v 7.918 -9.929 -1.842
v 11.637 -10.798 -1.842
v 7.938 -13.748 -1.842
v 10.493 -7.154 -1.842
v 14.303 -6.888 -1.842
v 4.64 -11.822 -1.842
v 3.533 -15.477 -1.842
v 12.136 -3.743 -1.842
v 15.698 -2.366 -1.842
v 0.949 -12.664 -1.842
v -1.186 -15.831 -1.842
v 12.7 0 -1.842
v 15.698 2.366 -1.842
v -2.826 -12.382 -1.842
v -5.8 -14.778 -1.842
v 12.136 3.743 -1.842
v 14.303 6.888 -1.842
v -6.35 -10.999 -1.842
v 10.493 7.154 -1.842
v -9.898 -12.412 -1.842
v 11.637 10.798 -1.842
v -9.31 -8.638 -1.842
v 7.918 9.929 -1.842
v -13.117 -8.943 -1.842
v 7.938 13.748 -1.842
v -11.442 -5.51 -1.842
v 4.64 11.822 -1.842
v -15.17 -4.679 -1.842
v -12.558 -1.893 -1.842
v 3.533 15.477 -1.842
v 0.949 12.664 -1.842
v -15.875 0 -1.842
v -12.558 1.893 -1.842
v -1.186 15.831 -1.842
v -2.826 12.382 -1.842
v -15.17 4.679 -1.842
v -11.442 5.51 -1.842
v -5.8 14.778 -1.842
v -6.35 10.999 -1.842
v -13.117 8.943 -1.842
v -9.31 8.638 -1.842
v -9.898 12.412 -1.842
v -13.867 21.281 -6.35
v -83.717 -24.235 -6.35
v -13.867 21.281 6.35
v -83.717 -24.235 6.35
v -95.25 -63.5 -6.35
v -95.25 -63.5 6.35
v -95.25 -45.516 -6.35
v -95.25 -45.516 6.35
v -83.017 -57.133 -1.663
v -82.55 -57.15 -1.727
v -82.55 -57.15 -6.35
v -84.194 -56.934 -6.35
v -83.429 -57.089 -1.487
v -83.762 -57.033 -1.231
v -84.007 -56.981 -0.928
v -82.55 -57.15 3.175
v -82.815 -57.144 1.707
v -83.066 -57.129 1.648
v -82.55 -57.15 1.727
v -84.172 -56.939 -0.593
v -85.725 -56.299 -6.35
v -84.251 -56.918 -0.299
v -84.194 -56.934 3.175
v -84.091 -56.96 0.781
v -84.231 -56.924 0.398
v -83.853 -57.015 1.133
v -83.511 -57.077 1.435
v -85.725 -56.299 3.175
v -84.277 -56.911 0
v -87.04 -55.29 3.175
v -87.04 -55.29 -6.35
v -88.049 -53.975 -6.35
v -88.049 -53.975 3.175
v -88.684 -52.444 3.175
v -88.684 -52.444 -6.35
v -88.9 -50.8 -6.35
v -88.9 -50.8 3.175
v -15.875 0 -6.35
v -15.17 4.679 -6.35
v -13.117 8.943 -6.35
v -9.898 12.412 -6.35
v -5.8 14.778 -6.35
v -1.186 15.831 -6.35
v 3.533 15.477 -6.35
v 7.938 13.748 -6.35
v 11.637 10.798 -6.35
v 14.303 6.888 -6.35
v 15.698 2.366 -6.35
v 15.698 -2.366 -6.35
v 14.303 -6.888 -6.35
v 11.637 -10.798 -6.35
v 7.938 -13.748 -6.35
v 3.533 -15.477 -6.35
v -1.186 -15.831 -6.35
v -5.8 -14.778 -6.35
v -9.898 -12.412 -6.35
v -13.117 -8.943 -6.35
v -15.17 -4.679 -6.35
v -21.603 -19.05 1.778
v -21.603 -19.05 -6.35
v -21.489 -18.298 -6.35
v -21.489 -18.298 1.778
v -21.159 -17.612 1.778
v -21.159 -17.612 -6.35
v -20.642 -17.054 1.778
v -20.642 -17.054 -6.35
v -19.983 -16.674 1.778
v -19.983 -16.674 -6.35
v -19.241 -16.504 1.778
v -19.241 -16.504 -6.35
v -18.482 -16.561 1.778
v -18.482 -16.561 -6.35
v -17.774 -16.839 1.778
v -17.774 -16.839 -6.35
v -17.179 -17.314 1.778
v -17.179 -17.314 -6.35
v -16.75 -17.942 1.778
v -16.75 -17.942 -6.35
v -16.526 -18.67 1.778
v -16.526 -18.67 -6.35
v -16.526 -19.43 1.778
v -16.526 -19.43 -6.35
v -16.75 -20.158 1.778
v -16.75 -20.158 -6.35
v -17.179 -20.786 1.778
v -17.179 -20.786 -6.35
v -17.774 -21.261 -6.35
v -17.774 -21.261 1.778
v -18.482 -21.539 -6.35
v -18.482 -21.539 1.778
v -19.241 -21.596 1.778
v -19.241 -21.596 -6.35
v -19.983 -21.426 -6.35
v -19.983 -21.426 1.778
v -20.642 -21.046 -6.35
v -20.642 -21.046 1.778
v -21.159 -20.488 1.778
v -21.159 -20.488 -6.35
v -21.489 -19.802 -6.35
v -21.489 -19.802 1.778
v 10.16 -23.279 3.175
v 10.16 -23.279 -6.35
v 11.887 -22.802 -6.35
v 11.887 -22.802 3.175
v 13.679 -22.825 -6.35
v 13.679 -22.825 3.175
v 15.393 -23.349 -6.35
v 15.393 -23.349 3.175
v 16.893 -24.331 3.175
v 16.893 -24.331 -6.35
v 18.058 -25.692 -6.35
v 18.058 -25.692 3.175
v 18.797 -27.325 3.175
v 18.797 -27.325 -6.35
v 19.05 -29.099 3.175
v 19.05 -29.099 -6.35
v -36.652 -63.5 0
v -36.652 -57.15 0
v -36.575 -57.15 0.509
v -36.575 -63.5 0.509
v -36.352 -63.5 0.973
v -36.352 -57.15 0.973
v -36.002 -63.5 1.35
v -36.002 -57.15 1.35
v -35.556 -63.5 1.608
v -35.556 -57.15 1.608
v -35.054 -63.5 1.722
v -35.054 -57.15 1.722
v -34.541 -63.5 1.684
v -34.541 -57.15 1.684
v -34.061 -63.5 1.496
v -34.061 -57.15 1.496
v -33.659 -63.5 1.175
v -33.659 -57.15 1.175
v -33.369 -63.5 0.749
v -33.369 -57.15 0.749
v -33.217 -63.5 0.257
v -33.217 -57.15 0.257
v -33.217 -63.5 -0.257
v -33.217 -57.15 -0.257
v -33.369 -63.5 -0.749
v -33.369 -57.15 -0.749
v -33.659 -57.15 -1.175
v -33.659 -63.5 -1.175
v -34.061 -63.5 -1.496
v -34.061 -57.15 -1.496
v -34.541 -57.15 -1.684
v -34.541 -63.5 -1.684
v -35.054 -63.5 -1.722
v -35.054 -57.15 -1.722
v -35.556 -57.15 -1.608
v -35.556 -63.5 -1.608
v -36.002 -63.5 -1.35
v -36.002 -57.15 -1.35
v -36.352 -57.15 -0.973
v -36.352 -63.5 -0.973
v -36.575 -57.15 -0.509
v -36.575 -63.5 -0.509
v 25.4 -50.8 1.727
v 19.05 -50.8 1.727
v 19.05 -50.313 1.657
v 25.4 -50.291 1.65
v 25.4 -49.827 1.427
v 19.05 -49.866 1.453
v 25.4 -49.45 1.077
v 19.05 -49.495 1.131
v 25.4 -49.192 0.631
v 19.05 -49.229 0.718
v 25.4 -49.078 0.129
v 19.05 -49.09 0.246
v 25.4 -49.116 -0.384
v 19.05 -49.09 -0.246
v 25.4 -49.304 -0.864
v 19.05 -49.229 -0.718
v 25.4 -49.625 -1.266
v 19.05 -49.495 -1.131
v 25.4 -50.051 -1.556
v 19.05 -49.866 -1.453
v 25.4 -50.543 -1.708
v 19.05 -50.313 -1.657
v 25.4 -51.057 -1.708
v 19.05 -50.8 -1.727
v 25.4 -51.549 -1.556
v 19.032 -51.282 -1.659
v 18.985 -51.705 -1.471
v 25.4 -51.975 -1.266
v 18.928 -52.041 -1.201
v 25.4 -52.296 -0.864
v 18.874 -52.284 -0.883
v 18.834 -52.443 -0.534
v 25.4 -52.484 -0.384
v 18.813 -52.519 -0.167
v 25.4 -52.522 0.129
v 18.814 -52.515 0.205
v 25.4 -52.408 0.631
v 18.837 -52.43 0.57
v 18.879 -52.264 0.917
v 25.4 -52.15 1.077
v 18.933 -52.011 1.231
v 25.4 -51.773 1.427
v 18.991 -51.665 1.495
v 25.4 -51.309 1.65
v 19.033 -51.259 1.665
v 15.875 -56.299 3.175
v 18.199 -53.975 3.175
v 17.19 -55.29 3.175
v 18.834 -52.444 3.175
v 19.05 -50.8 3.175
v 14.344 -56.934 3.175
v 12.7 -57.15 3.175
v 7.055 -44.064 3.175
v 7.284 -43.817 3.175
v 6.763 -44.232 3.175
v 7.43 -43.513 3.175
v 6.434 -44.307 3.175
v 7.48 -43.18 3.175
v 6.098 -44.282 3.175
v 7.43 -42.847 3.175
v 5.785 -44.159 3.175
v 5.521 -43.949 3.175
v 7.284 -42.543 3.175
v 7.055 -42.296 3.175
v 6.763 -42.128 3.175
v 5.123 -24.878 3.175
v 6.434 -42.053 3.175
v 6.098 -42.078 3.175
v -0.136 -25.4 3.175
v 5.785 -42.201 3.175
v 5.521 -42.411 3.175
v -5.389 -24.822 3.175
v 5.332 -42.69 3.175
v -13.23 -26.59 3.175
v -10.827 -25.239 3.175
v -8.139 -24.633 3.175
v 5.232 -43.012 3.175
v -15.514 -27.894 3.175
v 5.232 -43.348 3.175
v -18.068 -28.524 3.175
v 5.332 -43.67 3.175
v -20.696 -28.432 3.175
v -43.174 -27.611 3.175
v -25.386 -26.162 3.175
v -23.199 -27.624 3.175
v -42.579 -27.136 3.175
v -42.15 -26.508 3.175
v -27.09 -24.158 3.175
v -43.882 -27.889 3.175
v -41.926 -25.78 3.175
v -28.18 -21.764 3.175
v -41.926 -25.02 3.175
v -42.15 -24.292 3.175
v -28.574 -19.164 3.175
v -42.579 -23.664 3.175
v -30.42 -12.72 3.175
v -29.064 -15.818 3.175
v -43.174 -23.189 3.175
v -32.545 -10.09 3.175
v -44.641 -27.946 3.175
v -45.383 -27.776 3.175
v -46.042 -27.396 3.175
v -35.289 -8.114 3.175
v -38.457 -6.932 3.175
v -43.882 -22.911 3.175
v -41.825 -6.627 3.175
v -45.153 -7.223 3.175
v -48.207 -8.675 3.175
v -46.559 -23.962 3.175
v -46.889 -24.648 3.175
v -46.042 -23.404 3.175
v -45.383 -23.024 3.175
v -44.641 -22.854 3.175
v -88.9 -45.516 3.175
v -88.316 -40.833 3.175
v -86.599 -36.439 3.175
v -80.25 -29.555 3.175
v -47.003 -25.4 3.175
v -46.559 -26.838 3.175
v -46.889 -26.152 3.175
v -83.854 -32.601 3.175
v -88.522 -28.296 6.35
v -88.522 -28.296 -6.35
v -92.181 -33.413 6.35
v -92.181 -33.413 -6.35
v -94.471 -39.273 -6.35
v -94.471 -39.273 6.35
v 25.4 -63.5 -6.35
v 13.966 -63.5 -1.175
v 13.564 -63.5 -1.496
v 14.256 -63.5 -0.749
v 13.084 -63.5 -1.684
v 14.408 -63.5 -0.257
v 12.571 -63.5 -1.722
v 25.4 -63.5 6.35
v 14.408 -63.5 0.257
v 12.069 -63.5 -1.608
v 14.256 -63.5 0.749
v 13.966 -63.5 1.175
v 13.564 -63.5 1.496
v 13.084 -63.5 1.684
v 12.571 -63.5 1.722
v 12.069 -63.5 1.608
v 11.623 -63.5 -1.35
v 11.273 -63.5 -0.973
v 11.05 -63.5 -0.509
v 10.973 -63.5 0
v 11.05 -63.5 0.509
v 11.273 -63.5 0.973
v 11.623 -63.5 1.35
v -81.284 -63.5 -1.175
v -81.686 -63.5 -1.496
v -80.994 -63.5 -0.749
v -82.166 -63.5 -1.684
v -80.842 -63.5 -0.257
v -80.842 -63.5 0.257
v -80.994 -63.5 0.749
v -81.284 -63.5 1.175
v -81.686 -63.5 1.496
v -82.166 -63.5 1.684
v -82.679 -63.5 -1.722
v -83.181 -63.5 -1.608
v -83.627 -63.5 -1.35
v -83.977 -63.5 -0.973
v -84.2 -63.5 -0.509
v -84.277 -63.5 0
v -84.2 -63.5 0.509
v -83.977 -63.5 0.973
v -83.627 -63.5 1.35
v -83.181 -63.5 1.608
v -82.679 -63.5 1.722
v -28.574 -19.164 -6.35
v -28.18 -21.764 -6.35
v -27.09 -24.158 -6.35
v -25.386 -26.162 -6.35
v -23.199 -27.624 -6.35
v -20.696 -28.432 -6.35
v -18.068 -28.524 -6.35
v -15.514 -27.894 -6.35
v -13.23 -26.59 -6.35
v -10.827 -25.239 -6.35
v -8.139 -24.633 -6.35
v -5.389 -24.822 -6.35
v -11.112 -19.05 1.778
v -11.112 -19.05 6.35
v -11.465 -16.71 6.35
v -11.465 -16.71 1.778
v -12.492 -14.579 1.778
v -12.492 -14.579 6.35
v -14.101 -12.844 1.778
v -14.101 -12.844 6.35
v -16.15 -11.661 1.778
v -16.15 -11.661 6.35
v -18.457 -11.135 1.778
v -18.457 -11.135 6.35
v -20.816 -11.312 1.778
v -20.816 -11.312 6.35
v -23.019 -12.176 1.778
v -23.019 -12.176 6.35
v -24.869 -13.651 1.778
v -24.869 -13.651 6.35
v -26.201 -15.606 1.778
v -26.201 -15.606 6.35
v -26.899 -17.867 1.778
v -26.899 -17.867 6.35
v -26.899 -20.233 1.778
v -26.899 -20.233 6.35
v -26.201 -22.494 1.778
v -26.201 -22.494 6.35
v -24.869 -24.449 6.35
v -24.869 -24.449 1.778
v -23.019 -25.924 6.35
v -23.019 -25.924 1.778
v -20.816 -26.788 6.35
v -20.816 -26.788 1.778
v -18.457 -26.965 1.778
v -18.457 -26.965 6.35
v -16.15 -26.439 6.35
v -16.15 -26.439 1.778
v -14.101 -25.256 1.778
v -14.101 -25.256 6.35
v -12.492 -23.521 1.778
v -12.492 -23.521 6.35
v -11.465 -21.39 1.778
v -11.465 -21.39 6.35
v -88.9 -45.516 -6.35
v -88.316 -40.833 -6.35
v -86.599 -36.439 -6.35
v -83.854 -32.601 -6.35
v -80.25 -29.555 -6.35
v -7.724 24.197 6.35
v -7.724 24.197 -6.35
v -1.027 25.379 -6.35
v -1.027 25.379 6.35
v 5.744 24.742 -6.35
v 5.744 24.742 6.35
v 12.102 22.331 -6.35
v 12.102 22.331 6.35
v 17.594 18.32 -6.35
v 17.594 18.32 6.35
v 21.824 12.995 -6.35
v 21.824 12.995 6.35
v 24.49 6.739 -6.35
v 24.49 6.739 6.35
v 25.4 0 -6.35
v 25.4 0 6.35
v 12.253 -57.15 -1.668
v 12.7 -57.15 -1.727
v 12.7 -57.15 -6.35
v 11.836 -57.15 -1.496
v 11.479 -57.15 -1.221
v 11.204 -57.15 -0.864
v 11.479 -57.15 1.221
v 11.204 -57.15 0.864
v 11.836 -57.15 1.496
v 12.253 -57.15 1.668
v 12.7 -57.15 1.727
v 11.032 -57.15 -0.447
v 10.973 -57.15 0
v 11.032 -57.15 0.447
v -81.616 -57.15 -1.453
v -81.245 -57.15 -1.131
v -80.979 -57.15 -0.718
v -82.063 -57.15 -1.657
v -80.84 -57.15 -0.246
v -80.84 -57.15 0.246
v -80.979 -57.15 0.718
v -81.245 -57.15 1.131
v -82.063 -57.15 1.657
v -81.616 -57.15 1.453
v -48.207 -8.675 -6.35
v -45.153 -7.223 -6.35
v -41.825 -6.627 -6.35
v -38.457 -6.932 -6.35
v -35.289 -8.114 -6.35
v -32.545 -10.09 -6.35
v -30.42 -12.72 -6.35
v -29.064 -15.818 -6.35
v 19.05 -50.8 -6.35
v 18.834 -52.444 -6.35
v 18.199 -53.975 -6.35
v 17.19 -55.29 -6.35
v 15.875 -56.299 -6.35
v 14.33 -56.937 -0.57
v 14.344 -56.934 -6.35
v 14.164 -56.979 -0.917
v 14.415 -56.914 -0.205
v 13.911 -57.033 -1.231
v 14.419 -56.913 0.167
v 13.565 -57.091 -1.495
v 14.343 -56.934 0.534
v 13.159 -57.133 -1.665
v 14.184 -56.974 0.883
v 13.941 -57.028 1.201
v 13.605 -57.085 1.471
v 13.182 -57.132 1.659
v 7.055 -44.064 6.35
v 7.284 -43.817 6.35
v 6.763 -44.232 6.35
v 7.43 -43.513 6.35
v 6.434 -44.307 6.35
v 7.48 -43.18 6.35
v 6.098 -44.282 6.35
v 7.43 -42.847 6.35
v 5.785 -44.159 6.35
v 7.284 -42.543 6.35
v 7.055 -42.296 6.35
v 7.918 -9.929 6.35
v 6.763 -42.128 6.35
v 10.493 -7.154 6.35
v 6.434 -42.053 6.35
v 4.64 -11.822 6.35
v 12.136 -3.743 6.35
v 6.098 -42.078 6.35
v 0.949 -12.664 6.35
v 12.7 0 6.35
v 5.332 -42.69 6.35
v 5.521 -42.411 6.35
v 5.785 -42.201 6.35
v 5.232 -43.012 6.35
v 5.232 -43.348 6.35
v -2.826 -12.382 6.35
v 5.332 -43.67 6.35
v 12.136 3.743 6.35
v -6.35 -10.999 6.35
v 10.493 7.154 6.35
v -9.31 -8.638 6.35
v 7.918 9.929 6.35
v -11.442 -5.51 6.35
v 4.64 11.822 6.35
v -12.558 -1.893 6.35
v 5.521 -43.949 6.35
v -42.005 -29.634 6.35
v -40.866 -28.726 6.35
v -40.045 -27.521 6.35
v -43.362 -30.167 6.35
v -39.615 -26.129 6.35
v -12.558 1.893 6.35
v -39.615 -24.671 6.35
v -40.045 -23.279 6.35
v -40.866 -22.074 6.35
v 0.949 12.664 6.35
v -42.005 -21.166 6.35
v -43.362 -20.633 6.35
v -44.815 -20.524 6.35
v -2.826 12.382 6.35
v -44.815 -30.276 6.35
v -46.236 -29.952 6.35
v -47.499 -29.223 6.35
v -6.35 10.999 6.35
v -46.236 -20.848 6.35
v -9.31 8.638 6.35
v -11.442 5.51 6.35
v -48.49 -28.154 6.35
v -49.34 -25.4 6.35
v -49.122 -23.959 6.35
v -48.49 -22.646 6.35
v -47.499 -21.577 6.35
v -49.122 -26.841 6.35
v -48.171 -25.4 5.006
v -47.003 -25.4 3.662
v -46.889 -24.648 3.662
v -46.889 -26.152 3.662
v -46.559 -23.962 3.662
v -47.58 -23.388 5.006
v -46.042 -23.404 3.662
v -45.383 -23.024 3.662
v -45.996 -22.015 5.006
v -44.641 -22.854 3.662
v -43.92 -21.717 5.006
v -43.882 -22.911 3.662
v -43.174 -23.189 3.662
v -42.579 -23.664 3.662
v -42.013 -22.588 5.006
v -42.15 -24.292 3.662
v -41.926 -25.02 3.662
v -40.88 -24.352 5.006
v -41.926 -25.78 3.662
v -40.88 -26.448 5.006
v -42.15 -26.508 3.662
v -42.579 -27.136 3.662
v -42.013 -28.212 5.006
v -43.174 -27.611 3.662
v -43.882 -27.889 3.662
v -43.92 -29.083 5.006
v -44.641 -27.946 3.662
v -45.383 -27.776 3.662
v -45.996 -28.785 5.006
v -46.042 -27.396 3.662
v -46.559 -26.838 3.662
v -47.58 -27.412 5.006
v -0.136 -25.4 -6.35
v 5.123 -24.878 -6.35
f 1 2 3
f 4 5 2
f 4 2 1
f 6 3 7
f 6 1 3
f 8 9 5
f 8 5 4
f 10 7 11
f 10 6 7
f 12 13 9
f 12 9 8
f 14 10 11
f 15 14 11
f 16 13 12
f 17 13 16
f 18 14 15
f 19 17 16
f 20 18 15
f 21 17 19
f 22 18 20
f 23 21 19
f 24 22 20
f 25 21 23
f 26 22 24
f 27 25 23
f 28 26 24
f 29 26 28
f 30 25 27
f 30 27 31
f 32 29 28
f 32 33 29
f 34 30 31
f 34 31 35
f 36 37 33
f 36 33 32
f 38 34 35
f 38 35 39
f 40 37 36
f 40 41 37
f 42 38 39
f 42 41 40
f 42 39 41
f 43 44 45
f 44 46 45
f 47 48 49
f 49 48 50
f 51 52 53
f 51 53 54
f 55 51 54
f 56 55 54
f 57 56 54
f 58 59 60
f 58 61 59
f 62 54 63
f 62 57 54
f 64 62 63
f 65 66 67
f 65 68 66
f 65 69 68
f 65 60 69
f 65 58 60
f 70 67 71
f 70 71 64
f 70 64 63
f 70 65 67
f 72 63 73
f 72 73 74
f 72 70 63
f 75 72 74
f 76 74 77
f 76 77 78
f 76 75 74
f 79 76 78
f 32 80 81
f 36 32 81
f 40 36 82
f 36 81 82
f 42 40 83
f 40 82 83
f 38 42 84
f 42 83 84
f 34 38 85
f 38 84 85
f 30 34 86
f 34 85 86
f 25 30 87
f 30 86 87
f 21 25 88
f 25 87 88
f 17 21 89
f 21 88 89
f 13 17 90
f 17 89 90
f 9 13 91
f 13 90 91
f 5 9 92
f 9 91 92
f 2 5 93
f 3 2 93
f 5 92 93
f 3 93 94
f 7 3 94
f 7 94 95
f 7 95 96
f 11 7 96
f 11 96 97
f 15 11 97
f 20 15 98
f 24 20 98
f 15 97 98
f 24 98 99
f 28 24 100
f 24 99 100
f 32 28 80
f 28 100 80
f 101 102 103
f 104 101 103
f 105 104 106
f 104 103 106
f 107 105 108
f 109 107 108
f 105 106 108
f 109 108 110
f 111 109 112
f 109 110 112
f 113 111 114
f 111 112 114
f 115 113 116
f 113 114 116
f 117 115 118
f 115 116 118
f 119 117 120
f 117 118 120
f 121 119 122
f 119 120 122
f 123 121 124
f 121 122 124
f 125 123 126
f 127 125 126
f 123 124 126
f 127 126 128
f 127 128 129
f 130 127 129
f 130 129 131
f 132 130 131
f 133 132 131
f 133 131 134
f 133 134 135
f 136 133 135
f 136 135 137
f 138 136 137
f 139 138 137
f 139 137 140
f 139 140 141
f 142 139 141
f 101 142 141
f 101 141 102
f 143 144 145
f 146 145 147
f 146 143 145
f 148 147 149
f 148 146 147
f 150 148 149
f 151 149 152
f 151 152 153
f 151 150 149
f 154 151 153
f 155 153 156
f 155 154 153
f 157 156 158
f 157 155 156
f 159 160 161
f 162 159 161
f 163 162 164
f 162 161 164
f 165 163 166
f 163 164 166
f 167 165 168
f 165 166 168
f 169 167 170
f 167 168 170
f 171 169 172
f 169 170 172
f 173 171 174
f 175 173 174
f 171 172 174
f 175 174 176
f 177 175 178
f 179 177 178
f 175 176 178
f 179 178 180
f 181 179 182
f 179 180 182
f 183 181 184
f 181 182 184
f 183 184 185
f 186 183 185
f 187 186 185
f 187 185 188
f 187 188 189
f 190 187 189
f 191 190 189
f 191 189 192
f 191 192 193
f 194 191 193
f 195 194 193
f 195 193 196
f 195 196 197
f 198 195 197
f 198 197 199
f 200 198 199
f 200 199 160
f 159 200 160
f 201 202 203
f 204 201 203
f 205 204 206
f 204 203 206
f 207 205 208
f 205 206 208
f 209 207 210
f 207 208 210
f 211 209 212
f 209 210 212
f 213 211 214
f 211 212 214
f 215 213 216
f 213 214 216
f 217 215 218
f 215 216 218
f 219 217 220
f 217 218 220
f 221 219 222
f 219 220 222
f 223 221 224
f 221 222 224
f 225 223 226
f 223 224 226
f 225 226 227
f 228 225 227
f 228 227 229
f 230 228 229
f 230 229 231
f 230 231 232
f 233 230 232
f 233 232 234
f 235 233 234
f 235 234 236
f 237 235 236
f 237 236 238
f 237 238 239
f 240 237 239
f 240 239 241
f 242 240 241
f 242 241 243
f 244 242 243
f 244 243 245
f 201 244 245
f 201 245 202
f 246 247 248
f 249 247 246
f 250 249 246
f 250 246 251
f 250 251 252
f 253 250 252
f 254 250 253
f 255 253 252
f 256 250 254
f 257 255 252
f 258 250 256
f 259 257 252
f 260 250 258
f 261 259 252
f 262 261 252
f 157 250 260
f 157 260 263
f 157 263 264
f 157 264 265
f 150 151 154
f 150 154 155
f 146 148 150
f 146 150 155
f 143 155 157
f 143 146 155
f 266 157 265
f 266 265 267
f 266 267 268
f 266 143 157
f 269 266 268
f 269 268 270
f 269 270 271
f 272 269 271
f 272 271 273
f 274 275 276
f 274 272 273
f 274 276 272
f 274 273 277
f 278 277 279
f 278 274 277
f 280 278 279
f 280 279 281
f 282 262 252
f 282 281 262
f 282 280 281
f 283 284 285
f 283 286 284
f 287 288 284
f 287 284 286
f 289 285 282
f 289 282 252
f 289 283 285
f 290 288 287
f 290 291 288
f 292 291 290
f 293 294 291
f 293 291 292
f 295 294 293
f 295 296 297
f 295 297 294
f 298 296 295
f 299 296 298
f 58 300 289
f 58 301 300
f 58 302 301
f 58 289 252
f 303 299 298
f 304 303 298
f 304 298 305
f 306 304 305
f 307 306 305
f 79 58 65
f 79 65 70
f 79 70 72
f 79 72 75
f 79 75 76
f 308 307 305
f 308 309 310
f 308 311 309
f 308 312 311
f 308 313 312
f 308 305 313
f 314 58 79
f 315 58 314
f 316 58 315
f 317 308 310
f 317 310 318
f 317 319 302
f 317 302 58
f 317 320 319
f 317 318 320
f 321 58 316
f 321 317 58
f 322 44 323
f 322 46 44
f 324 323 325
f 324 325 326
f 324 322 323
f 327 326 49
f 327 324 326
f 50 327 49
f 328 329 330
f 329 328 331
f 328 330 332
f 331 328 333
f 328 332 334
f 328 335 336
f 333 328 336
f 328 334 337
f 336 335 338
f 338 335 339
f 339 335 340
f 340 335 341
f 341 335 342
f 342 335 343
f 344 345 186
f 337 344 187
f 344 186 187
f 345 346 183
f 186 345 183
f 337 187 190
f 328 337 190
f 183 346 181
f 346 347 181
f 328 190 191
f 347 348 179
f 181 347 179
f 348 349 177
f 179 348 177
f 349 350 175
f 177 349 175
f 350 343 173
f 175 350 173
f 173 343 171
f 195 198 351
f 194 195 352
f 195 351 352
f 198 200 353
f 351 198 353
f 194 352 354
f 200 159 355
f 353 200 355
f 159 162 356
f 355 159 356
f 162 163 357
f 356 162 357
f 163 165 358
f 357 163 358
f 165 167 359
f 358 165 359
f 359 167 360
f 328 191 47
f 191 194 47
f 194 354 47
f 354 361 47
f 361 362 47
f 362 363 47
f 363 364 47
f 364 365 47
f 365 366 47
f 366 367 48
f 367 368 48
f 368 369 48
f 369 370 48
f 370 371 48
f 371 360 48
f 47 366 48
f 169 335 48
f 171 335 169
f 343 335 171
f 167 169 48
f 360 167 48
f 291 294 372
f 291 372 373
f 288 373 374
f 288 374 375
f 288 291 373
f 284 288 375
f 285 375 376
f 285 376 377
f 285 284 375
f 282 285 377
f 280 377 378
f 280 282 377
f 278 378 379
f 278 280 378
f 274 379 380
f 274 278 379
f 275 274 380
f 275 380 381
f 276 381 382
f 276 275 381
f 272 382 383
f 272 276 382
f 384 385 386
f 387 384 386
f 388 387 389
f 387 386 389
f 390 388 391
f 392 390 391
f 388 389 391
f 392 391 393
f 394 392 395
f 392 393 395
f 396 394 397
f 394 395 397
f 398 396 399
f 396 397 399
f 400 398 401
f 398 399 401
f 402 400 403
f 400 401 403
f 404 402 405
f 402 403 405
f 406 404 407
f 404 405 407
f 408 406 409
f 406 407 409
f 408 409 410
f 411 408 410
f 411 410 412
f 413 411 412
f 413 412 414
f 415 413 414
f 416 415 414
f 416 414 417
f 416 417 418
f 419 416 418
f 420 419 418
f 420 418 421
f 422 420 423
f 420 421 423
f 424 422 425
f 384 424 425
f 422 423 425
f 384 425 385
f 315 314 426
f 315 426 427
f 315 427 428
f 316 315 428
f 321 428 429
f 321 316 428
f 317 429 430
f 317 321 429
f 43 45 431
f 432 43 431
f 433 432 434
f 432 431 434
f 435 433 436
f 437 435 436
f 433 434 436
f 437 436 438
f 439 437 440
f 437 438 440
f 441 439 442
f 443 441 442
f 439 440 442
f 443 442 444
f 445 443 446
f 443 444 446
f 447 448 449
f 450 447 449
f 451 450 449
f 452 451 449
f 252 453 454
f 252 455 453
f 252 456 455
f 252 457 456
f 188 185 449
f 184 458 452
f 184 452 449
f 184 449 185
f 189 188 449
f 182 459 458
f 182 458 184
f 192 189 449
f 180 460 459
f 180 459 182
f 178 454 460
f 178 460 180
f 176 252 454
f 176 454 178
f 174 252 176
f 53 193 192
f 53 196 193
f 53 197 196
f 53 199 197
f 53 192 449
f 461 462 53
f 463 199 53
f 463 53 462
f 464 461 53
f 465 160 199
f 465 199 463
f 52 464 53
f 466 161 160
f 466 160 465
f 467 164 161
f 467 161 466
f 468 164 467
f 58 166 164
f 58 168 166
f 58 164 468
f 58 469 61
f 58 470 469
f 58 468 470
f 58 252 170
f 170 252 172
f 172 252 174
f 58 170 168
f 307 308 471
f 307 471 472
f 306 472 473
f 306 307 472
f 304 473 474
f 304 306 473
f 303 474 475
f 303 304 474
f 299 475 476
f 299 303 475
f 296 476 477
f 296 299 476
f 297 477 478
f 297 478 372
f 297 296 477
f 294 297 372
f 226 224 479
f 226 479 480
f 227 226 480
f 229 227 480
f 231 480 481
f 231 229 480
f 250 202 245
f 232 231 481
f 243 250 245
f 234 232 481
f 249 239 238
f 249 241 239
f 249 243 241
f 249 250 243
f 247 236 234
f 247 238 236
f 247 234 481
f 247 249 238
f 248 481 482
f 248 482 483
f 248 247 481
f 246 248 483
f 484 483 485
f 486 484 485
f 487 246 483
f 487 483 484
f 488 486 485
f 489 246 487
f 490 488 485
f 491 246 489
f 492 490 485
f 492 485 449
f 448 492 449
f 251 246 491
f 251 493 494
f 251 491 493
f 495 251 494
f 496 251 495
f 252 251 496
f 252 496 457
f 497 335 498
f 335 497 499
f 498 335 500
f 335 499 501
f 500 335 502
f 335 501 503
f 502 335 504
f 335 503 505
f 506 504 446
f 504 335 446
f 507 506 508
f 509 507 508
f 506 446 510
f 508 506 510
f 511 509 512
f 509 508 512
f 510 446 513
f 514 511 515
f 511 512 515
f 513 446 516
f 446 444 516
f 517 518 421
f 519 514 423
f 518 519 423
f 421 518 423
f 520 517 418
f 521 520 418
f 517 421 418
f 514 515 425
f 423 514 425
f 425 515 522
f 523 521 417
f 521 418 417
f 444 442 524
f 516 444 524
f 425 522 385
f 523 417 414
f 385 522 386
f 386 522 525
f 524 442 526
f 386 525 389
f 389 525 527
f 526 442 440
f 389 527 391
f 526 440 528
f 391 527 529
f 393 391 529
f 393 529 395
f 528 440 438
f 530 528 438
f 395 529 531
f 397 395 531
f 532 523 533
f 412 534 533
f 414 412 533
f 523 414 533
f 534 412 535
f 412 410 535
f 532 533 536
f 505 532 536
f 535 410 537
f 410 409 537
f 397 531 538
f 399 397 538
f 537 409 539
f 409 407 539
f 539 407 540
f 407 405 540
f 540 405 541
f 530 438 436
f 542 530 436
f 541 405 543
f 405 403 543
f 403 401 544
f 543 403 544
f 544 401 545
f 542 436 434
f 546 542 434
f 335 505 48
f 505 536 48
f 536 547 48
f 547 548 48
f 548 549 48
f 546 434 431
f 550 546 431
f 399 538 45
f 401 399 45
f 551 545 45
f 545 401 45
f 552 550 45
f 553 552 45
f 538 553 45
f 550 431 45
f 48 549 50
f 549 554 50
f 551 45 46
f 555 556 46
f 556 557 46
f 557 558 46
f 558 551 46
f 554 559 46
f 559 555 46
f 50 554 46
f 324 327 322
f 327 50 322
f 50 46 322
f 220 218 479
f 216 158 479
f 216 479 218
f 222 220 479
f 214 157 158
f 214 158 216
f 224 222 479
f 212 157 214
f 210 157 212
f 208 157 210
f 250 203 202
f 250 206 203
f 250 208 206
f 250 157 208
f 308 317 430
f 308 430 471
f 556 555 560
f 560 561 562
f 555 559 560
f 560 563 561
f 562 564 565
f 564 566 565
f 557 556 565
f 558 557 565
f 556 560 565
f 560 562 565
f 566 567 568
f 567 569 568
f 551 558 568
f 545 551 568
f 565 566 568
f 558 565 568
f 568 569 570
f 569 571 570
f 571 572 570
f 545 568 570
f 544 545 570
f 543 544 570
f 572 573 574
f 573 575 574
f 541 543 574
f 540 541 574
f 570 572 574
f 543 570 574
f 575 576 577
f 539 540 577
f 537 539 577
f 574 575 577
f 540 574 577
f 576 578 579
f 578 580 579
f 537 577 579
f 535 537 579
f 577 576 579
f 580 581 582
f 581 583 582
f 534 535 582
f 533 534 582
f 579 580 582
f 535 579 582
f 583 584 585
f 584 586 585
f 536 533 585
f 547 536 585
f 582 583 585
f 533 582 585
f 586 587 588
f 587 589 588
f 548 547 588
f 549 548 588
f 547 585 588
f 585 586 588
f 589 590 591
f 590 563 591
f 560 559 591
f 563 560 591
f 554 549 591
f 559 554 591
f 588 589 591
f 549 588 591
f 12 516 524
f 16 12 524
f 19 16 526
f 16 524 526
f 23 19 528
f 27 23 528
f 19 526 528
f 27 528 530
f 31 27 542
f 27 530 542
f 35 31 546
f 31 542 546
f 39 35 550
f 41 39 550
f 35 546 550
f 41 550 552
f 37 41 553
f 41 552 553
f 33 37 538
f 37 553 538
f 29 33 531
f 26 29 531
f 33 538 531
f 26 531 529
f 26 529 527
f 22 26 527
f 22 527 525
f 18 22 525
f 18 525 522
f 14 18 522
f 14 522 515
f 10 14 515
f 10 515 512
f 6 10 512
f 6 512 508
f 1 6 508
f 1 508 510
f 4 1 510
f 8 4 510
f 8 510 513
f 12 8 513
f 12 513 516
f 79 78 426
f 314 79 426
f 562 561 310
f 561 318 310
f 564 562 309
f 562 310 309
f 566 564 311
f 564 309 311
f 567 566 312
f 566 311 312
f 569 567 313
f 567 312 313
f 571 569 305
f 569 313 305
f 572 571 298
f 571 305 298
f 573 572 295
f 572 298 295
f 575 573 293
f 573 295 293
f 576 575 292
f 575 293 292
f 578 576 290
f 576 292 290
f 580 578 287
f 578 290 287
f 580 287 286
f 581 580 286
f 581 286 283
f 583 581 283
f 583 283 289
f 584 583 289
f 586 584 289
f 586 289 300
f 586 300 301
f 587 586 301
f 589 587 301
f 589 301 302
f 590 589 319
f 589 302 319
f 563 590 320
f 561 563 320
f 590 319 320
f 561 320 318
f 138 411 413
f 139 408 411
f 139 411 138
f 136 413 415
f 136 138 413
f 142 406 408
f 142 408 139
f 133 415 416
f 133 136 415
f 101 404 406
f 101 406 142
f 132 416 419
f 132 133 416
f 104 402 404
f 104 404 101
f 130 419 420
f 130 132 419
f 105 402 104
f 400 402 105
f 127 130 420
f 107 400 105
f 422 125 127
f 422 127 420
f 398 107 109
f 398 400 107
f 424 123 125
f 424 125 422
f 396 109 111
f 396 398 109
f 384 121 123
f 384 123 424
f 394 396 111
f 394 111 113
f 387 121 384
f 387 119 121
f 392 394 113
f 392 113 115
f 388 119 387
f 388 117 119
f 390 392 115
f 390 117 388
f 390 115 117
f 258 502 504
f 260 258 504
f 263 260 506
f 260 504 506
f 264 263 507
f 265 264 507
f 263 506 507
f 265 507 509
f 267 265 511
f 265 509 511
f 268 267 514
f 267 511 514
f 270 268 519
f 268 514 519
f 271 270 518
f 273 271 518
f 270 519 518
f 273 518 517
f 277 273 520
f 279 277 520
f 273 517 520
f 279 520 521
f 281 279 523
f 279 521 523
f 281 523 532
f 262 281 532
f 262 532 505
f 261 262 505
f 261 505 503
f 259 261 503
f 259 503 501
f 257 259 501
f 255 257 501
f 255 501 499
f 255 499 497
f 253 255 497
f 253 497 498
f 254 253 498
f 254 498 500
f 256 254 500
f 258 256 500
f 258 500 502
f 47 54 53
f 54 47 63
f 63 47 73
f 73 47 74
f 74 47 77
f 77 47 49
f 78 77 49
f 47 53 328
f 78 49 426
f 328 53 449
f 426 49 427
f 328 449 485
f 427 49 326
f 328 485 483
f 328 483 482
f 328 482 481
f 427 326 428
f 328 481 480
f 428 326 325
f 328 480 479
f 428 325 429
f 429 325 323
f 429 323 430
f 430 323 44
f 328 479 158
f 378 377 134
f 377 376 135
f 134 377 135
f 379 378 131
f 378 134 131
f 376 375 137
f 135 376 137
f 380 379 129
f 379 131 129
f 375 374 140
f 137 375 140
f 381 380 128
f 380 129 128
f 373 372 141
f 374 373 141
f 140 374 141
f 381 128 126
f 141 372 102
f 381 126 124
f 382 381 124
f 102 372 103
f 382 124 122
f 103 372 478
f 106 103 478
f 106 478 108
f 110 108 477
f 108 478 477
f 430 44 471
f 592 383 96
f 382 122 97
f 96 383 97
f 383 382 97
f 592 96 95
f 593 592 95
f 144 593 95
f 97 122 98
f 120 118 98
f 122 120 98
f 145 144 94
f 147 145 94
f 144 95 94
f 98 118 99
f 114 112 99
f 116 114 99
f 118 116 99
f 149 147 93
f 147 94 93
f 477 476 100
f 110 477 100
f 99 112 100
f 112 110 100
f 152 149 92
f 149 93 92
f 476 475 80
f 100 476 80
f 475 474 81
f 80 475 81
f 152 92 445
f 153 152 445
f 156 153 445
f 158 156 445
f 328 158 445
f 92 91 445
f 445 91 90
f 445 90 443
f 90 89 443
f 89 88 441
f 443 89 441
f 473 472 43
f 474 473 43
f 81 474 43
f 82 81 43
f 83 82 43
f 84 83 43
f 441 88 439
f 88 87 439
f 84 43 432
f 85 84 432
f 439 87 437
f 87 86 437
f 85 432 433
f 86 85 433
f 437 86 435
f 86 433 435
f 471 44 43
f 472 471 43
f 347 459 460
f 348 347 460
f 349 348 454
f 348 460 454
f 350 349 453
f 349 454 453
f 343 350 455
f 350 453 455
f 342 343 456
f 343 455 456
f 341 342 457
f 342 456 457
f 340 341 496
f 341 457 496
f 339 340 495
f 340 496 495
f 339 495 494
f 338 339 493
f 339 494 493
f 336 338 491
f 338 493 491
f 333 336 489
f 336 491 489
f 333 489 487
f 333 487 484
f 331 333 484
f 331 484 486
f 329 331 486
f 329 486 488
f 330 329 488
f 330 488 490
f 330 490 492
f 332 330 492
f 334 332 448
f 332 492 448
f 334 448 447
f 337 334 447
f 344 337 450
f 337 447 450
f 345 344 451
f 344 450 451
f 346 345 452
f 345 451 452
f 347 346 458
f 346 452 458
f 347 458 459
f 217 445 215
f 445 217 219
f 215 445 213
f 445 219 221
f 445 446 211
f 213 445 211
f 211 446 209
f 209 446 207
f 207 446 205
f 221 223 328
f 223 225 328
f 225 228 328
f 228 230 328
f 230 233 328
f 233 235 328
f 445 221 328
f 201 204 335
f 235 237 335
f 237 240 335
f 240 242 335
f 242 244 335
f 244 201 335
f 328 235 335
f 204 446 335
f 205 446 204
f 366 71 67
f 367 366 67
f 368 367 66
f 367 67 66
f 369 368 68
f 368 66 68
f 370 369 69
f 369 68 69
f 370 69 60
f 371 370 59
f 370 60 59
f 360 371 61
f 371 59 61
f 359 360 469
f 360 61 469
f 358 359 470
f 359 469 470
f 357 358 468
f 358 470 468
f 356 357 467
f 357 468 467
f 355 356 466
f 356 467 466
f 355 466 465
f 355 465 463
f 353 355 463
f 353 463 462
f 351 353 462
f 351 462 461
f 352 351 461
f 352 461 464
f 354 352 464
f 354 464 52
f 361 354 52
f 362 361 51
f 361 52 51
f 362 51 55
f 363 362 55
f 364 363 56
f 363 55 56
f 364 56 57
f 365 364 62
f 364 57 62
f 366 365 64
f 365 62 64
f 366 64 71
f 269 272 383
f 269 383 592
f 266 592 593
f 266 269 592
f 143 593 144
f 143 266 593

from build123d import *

# Parameters (mm, degrees)
BOSS_EXTRUDE1_DEPTH                             = 6.35
SKETCH4_R                                       = 12.7
CUT_EXTRUDE3_DEPTH                              = 116.178567885
SKETCH5_R                                       = 15.875
CUT_EXTRUDE4_DEPTH                              = 4.5085
FILLET1_R                                       = 25.4
F_8_32_TAPPED_HOLE2_D                           = 3.4544
F_8_32_TAPPED_HOLE2_DEPTH                       = 10.668
F_8_32_TAPPED_HOLE2_TIP                         = 1.037806461
F_1_4_20_TAPPED_HOLE1_D                         = 5.1054
SKETCH27_R                                      = 7.9375
CUT_EXTRUDE6_DEPTH                              = 4.572
CUT_EXTRUDE8_START                              = -9.525
CUT_EXTRUDE8_DEPTH                              = 9.525
FILLET2_R                                       = 6.35
F_8_32_TAPPED_HOLE1_D                           = 3.4544
F_8_32_TAPPED_HOLE1_DEPTH                       = 10.668
F_8_32_TAPPED_HOLE1_TIP                         = 1.037806461
F_4_40_TAPPED_HOLE1_D                           = 2.2606
F_4_40_TAPPED_HOLE1_DEPTH                       = 7.62
F_4_40_TAPPED_HOLE1_TIP                         = 0.679152758
CSK_FOR_10_FLAT_HEAD_MACHINE_SCREW1_D           = 5.1054
CSK_FOR_10_FLAT_HEAD_MACHINE_SCREW1_CSINK_D     = 9.779
CSK_FOR_10_FLAT_HEAD_MACHINE_SCREW1_CSINK_ANGLE = 82


with BuildPart() as part:
    # Sketch1 → Boss-Extrude1 (new, symmetric)
    with BuildSketch(Plane.XY):
        with BuildLine():
            Line((25.4, 0), (25.4, -63.5))
            Line((25.4, -63.5), (-95.25, -63.5))
            Line((-95.25, -63.5), (-95.25, -31.75))
            Line((-95.25, -31.75), (-13.866905739, 21.280717216))
            ThreePointArc((-13.866905739, 21.280717216), (12.10249136, 22.33136142), (25.4, 0))
        make_face()
    extrude(amount=BOSS_EXTRUDE1_DEPTH, both=True)

    # Sketch4 → Cut-Extrude3 (cut, through all)
    with BuildSketch(Plane.XY.offset(6.35)):
        Circle(SKETCH4_R)
    extrude(amount=-CUT_EXTRUDE3_DEPTH, mode=Mode.SUBTRACT)

    # Sketch5 → Cut-Extrude4 (cut)
    with BuildSketch(Plane(origin=(0, 0, -6.35), x_dir=(-1, 0, 0), z_dir=(0, 0, -1))):
        Circle(SKETCH5_R)
    extrude(amount=-CUT_EXTRUDE4_DEPTH, mode=Mode.SUBTRACT)

    # Fillet1
    fillet1_edges = [part.edges().sort_by_distance(p)[0] for p in [
        (-95.25, -31.75, 0),
    ]]
    fillet(fillet1_edges, radius=FILLET1_R)

    # #8-32 Tapped Hole2
    with Locations(Plane(origin=(25.4, 0, 0), x_dir=(0, 0, -1), z_dir=(1, 0, 0))):
        with Locations((0, -50.8)):
            Hole(F_8_32_TAPPED_HOLE2_D / 2, depth=F_8_32_TAPPED_HOLE2_DEPTH)
            with Locations((0, 0, -(F_8_32_TAPPED_HOLE2_DEPTH + F_8_32_TAPPED_HOLE2_TIP / 2))):  # 118° drill point
                Cone(0, F_8_32_TAPPED_HOLE2_D / 2, F_8_32_TAPPED_HOLE2_TIP, mode=Mode.SUBTRACT)

    # 1/4-20 Tapped Hole1 (through all)
    with Locations(Plane.XY.offset(6.35)):
        with Locations((-19.05, -19.05)):
            Hole(F_1_4_20_TAPPED_HOLE1_D / 2)

    # Sketch27 → Cut-Extrude6 (cut)
    with BuildSketch(Plane.XY.offset(6.35)):
        with Locations((-19.05, -19.05)):
            Circle(SKETCH27_R)
    extrude(amount=-CUT_EXTRUDE6_DEPTH, mode=Mode.SUBTRACT)

    # Sketch28 → Cut-Extrude8 (cut)
    with BuildSketch(Plane(origin=(0, 0, -6.35), x_dir=(-1, 0, 0), z_dir=(0, 0, -1)).offset(CUT_EXTRUDE8_START)):
        with BuildLine():
            ThreePointArc((5.38883143, -24.821774631), (-7.920985408, -24.133337734), (-19.05, -16.800520825))
            Line((-19.05, -16.800520825), (-19.05, -57.15))
            Line((-19.05, -57.15), (88.9, -57.15))
            Line((88.9, -57.15), (88.9, -45.515541418))
            ThreePointArc((88.9, -45.515541418), (86.598521065, -36.438672898), (80.250179304, -29.555003506))
            Line((80.250179304, -29.555003506), (48.206868735, -8.674994495))
            ThreePointArc((48.206868735, -8.674994495), (35.288934952, -8.113746603), (28.574321085, -19.163722759))
            ThreePointArc((28.574321085, -19.163722759), (23.199392186, -27.623690541), (13.229821608, -26.589970059))
            ThreePointArc((13.229821608, -26.589970059), (9.504977418, -24.838266448), (5.38883143, -24.821774631))
        make_face()
    extrude(amount=CUT_EXTRUDE8_DEPTH, mode=Mode.SUBTRACT)

    # Fillet2
    # the kernel refuses this fillet: 6.35 mm, written as the material it adds along each edge
    with BuildSketch(Plane(origin=(19.05, -57.15, 3.175), x_dir=(0, 1, 0), z_dir=(0, 0, -1))) as fillet2_piece_1_section:
        with BuildLine():
            CenterArc((FILLET2_R, -FILLET2_R), FILLET2_R, 90, 90)
            Line((0, -FILLET2_R), (0, 0))
            Line((0, 0), (FILLET2_R, 0))
        make_face()
    fillet2_piece_1 = extrude(amount=9.525, mode=Mode.PRIVATE)
    fillet2_piece_1 = fillet2_piece_1 - Plane(origin=(17.599243773, -50.8, 0), x_dir=(0, 0, 1), z_dir=(-1, 0, 0)) * Cylinder(1.7272, 45, mode=Mode.PRIVATE)
    add(fillet2_piece_1)
    with BuildSketch(Plane(origin=(-88.9, -57.15, 3.175), x_dir=(1, 0, 0), z_dir=(0, 0, -1))) as fillet2_piece_2:
        with BuildLine():
            CenterArc((FILLET2_R, -FILLET2_R), FILLET2_R, 90, 90)
            Line((0, -FILLET2_R), (0, 0))
            Line((0, 0), (FILLET2_R, 0))
        make_face()
    extrude(amount=9.525)
    with BuildSketch(Plane(origin=(19.05, -16.800520825, 3.175), x_dir=(-0.8081515274529607, -0.5889746248145555, 0), z_dir=(0, 0, -1))) as fillet2_piece_3:
        with BuildLine():
            CenterArc((12.375463834, -6.199333292), FILLET2_R, 102.506099706, 113.578178478)
            Line((7.243701634, -9.93932216), (0, 0))
            ThreePointArc((0, 0), (5.500206148, -0.60266683), (11.000412296, 0))
        make_face()
    extrude(amount=9.525)

    # #8-32 Tapped Hole1
    with Locations(Plane.XZ.offset(63.5)):
        with Locations((12.7, 0), (-34.925, 0), (-82.55, 0)):
            Hole(F_8_32_TAPPED_HOLE1_D / 2, depth=F_8_32_TAPPED_HOLE1_DEPTH)
            with Locations((0, 0, -(F_8_32_TAPPED_HOLE1_DEPTH + F_8_32_TAPPED_HOLE1_TIP / 2))):  # 118° drill point
                Cone(0, F_8_32_TAPPED_HOLE1_D / 2, F_8_32_TAPPED_HOLE1_TIP, mode=Mode.SUBTRACT)

    # #4-40 Tapped Hole1
    with Locations(Plane(origin=(0, 0, 3.175), x_dir=(-1, 0, 0), z_dir=(0, 0, -1))):
        with Locations((-6.35, -43.18)):
            Hole(F_4_40_TAPPED_HOLE1_D / 2, depth=F_4_40_TAPPED_HOLE1_DEPTH)
            with Locations((0, 0, -(F_4_40_TAPPED_HOLE1_DEPTH + F_4_40_TAPPED_HOLE1_TIP / 2))):  # 118° drill point
                Cone(0, F_4_40_TAPPED_HOLE1_D / 2, F_4_40_TAPPED_HOLE1_TIP, mode=Mode.SUBTRACT)

    # CSK for #10 Flat Head Machine Screw1 (through all)
    with Locations(Plane.XY.offset(6.35)):
        with Locations((-44.45, -25.4)):
            CounterSinkHole(CSK_FOR_10_FLAT_HEAD_MACHINE_SCREW1_D / 2, CSK_FOR_10_FLAT_HEAD_MACHINE_SCREW1_CSINK_D / 2, counter_sink_angle=CSK_FOR_10_FLAT_HEAD_MACHINE_SCREW1_CSINK_ANGLE)


solid = part.part
